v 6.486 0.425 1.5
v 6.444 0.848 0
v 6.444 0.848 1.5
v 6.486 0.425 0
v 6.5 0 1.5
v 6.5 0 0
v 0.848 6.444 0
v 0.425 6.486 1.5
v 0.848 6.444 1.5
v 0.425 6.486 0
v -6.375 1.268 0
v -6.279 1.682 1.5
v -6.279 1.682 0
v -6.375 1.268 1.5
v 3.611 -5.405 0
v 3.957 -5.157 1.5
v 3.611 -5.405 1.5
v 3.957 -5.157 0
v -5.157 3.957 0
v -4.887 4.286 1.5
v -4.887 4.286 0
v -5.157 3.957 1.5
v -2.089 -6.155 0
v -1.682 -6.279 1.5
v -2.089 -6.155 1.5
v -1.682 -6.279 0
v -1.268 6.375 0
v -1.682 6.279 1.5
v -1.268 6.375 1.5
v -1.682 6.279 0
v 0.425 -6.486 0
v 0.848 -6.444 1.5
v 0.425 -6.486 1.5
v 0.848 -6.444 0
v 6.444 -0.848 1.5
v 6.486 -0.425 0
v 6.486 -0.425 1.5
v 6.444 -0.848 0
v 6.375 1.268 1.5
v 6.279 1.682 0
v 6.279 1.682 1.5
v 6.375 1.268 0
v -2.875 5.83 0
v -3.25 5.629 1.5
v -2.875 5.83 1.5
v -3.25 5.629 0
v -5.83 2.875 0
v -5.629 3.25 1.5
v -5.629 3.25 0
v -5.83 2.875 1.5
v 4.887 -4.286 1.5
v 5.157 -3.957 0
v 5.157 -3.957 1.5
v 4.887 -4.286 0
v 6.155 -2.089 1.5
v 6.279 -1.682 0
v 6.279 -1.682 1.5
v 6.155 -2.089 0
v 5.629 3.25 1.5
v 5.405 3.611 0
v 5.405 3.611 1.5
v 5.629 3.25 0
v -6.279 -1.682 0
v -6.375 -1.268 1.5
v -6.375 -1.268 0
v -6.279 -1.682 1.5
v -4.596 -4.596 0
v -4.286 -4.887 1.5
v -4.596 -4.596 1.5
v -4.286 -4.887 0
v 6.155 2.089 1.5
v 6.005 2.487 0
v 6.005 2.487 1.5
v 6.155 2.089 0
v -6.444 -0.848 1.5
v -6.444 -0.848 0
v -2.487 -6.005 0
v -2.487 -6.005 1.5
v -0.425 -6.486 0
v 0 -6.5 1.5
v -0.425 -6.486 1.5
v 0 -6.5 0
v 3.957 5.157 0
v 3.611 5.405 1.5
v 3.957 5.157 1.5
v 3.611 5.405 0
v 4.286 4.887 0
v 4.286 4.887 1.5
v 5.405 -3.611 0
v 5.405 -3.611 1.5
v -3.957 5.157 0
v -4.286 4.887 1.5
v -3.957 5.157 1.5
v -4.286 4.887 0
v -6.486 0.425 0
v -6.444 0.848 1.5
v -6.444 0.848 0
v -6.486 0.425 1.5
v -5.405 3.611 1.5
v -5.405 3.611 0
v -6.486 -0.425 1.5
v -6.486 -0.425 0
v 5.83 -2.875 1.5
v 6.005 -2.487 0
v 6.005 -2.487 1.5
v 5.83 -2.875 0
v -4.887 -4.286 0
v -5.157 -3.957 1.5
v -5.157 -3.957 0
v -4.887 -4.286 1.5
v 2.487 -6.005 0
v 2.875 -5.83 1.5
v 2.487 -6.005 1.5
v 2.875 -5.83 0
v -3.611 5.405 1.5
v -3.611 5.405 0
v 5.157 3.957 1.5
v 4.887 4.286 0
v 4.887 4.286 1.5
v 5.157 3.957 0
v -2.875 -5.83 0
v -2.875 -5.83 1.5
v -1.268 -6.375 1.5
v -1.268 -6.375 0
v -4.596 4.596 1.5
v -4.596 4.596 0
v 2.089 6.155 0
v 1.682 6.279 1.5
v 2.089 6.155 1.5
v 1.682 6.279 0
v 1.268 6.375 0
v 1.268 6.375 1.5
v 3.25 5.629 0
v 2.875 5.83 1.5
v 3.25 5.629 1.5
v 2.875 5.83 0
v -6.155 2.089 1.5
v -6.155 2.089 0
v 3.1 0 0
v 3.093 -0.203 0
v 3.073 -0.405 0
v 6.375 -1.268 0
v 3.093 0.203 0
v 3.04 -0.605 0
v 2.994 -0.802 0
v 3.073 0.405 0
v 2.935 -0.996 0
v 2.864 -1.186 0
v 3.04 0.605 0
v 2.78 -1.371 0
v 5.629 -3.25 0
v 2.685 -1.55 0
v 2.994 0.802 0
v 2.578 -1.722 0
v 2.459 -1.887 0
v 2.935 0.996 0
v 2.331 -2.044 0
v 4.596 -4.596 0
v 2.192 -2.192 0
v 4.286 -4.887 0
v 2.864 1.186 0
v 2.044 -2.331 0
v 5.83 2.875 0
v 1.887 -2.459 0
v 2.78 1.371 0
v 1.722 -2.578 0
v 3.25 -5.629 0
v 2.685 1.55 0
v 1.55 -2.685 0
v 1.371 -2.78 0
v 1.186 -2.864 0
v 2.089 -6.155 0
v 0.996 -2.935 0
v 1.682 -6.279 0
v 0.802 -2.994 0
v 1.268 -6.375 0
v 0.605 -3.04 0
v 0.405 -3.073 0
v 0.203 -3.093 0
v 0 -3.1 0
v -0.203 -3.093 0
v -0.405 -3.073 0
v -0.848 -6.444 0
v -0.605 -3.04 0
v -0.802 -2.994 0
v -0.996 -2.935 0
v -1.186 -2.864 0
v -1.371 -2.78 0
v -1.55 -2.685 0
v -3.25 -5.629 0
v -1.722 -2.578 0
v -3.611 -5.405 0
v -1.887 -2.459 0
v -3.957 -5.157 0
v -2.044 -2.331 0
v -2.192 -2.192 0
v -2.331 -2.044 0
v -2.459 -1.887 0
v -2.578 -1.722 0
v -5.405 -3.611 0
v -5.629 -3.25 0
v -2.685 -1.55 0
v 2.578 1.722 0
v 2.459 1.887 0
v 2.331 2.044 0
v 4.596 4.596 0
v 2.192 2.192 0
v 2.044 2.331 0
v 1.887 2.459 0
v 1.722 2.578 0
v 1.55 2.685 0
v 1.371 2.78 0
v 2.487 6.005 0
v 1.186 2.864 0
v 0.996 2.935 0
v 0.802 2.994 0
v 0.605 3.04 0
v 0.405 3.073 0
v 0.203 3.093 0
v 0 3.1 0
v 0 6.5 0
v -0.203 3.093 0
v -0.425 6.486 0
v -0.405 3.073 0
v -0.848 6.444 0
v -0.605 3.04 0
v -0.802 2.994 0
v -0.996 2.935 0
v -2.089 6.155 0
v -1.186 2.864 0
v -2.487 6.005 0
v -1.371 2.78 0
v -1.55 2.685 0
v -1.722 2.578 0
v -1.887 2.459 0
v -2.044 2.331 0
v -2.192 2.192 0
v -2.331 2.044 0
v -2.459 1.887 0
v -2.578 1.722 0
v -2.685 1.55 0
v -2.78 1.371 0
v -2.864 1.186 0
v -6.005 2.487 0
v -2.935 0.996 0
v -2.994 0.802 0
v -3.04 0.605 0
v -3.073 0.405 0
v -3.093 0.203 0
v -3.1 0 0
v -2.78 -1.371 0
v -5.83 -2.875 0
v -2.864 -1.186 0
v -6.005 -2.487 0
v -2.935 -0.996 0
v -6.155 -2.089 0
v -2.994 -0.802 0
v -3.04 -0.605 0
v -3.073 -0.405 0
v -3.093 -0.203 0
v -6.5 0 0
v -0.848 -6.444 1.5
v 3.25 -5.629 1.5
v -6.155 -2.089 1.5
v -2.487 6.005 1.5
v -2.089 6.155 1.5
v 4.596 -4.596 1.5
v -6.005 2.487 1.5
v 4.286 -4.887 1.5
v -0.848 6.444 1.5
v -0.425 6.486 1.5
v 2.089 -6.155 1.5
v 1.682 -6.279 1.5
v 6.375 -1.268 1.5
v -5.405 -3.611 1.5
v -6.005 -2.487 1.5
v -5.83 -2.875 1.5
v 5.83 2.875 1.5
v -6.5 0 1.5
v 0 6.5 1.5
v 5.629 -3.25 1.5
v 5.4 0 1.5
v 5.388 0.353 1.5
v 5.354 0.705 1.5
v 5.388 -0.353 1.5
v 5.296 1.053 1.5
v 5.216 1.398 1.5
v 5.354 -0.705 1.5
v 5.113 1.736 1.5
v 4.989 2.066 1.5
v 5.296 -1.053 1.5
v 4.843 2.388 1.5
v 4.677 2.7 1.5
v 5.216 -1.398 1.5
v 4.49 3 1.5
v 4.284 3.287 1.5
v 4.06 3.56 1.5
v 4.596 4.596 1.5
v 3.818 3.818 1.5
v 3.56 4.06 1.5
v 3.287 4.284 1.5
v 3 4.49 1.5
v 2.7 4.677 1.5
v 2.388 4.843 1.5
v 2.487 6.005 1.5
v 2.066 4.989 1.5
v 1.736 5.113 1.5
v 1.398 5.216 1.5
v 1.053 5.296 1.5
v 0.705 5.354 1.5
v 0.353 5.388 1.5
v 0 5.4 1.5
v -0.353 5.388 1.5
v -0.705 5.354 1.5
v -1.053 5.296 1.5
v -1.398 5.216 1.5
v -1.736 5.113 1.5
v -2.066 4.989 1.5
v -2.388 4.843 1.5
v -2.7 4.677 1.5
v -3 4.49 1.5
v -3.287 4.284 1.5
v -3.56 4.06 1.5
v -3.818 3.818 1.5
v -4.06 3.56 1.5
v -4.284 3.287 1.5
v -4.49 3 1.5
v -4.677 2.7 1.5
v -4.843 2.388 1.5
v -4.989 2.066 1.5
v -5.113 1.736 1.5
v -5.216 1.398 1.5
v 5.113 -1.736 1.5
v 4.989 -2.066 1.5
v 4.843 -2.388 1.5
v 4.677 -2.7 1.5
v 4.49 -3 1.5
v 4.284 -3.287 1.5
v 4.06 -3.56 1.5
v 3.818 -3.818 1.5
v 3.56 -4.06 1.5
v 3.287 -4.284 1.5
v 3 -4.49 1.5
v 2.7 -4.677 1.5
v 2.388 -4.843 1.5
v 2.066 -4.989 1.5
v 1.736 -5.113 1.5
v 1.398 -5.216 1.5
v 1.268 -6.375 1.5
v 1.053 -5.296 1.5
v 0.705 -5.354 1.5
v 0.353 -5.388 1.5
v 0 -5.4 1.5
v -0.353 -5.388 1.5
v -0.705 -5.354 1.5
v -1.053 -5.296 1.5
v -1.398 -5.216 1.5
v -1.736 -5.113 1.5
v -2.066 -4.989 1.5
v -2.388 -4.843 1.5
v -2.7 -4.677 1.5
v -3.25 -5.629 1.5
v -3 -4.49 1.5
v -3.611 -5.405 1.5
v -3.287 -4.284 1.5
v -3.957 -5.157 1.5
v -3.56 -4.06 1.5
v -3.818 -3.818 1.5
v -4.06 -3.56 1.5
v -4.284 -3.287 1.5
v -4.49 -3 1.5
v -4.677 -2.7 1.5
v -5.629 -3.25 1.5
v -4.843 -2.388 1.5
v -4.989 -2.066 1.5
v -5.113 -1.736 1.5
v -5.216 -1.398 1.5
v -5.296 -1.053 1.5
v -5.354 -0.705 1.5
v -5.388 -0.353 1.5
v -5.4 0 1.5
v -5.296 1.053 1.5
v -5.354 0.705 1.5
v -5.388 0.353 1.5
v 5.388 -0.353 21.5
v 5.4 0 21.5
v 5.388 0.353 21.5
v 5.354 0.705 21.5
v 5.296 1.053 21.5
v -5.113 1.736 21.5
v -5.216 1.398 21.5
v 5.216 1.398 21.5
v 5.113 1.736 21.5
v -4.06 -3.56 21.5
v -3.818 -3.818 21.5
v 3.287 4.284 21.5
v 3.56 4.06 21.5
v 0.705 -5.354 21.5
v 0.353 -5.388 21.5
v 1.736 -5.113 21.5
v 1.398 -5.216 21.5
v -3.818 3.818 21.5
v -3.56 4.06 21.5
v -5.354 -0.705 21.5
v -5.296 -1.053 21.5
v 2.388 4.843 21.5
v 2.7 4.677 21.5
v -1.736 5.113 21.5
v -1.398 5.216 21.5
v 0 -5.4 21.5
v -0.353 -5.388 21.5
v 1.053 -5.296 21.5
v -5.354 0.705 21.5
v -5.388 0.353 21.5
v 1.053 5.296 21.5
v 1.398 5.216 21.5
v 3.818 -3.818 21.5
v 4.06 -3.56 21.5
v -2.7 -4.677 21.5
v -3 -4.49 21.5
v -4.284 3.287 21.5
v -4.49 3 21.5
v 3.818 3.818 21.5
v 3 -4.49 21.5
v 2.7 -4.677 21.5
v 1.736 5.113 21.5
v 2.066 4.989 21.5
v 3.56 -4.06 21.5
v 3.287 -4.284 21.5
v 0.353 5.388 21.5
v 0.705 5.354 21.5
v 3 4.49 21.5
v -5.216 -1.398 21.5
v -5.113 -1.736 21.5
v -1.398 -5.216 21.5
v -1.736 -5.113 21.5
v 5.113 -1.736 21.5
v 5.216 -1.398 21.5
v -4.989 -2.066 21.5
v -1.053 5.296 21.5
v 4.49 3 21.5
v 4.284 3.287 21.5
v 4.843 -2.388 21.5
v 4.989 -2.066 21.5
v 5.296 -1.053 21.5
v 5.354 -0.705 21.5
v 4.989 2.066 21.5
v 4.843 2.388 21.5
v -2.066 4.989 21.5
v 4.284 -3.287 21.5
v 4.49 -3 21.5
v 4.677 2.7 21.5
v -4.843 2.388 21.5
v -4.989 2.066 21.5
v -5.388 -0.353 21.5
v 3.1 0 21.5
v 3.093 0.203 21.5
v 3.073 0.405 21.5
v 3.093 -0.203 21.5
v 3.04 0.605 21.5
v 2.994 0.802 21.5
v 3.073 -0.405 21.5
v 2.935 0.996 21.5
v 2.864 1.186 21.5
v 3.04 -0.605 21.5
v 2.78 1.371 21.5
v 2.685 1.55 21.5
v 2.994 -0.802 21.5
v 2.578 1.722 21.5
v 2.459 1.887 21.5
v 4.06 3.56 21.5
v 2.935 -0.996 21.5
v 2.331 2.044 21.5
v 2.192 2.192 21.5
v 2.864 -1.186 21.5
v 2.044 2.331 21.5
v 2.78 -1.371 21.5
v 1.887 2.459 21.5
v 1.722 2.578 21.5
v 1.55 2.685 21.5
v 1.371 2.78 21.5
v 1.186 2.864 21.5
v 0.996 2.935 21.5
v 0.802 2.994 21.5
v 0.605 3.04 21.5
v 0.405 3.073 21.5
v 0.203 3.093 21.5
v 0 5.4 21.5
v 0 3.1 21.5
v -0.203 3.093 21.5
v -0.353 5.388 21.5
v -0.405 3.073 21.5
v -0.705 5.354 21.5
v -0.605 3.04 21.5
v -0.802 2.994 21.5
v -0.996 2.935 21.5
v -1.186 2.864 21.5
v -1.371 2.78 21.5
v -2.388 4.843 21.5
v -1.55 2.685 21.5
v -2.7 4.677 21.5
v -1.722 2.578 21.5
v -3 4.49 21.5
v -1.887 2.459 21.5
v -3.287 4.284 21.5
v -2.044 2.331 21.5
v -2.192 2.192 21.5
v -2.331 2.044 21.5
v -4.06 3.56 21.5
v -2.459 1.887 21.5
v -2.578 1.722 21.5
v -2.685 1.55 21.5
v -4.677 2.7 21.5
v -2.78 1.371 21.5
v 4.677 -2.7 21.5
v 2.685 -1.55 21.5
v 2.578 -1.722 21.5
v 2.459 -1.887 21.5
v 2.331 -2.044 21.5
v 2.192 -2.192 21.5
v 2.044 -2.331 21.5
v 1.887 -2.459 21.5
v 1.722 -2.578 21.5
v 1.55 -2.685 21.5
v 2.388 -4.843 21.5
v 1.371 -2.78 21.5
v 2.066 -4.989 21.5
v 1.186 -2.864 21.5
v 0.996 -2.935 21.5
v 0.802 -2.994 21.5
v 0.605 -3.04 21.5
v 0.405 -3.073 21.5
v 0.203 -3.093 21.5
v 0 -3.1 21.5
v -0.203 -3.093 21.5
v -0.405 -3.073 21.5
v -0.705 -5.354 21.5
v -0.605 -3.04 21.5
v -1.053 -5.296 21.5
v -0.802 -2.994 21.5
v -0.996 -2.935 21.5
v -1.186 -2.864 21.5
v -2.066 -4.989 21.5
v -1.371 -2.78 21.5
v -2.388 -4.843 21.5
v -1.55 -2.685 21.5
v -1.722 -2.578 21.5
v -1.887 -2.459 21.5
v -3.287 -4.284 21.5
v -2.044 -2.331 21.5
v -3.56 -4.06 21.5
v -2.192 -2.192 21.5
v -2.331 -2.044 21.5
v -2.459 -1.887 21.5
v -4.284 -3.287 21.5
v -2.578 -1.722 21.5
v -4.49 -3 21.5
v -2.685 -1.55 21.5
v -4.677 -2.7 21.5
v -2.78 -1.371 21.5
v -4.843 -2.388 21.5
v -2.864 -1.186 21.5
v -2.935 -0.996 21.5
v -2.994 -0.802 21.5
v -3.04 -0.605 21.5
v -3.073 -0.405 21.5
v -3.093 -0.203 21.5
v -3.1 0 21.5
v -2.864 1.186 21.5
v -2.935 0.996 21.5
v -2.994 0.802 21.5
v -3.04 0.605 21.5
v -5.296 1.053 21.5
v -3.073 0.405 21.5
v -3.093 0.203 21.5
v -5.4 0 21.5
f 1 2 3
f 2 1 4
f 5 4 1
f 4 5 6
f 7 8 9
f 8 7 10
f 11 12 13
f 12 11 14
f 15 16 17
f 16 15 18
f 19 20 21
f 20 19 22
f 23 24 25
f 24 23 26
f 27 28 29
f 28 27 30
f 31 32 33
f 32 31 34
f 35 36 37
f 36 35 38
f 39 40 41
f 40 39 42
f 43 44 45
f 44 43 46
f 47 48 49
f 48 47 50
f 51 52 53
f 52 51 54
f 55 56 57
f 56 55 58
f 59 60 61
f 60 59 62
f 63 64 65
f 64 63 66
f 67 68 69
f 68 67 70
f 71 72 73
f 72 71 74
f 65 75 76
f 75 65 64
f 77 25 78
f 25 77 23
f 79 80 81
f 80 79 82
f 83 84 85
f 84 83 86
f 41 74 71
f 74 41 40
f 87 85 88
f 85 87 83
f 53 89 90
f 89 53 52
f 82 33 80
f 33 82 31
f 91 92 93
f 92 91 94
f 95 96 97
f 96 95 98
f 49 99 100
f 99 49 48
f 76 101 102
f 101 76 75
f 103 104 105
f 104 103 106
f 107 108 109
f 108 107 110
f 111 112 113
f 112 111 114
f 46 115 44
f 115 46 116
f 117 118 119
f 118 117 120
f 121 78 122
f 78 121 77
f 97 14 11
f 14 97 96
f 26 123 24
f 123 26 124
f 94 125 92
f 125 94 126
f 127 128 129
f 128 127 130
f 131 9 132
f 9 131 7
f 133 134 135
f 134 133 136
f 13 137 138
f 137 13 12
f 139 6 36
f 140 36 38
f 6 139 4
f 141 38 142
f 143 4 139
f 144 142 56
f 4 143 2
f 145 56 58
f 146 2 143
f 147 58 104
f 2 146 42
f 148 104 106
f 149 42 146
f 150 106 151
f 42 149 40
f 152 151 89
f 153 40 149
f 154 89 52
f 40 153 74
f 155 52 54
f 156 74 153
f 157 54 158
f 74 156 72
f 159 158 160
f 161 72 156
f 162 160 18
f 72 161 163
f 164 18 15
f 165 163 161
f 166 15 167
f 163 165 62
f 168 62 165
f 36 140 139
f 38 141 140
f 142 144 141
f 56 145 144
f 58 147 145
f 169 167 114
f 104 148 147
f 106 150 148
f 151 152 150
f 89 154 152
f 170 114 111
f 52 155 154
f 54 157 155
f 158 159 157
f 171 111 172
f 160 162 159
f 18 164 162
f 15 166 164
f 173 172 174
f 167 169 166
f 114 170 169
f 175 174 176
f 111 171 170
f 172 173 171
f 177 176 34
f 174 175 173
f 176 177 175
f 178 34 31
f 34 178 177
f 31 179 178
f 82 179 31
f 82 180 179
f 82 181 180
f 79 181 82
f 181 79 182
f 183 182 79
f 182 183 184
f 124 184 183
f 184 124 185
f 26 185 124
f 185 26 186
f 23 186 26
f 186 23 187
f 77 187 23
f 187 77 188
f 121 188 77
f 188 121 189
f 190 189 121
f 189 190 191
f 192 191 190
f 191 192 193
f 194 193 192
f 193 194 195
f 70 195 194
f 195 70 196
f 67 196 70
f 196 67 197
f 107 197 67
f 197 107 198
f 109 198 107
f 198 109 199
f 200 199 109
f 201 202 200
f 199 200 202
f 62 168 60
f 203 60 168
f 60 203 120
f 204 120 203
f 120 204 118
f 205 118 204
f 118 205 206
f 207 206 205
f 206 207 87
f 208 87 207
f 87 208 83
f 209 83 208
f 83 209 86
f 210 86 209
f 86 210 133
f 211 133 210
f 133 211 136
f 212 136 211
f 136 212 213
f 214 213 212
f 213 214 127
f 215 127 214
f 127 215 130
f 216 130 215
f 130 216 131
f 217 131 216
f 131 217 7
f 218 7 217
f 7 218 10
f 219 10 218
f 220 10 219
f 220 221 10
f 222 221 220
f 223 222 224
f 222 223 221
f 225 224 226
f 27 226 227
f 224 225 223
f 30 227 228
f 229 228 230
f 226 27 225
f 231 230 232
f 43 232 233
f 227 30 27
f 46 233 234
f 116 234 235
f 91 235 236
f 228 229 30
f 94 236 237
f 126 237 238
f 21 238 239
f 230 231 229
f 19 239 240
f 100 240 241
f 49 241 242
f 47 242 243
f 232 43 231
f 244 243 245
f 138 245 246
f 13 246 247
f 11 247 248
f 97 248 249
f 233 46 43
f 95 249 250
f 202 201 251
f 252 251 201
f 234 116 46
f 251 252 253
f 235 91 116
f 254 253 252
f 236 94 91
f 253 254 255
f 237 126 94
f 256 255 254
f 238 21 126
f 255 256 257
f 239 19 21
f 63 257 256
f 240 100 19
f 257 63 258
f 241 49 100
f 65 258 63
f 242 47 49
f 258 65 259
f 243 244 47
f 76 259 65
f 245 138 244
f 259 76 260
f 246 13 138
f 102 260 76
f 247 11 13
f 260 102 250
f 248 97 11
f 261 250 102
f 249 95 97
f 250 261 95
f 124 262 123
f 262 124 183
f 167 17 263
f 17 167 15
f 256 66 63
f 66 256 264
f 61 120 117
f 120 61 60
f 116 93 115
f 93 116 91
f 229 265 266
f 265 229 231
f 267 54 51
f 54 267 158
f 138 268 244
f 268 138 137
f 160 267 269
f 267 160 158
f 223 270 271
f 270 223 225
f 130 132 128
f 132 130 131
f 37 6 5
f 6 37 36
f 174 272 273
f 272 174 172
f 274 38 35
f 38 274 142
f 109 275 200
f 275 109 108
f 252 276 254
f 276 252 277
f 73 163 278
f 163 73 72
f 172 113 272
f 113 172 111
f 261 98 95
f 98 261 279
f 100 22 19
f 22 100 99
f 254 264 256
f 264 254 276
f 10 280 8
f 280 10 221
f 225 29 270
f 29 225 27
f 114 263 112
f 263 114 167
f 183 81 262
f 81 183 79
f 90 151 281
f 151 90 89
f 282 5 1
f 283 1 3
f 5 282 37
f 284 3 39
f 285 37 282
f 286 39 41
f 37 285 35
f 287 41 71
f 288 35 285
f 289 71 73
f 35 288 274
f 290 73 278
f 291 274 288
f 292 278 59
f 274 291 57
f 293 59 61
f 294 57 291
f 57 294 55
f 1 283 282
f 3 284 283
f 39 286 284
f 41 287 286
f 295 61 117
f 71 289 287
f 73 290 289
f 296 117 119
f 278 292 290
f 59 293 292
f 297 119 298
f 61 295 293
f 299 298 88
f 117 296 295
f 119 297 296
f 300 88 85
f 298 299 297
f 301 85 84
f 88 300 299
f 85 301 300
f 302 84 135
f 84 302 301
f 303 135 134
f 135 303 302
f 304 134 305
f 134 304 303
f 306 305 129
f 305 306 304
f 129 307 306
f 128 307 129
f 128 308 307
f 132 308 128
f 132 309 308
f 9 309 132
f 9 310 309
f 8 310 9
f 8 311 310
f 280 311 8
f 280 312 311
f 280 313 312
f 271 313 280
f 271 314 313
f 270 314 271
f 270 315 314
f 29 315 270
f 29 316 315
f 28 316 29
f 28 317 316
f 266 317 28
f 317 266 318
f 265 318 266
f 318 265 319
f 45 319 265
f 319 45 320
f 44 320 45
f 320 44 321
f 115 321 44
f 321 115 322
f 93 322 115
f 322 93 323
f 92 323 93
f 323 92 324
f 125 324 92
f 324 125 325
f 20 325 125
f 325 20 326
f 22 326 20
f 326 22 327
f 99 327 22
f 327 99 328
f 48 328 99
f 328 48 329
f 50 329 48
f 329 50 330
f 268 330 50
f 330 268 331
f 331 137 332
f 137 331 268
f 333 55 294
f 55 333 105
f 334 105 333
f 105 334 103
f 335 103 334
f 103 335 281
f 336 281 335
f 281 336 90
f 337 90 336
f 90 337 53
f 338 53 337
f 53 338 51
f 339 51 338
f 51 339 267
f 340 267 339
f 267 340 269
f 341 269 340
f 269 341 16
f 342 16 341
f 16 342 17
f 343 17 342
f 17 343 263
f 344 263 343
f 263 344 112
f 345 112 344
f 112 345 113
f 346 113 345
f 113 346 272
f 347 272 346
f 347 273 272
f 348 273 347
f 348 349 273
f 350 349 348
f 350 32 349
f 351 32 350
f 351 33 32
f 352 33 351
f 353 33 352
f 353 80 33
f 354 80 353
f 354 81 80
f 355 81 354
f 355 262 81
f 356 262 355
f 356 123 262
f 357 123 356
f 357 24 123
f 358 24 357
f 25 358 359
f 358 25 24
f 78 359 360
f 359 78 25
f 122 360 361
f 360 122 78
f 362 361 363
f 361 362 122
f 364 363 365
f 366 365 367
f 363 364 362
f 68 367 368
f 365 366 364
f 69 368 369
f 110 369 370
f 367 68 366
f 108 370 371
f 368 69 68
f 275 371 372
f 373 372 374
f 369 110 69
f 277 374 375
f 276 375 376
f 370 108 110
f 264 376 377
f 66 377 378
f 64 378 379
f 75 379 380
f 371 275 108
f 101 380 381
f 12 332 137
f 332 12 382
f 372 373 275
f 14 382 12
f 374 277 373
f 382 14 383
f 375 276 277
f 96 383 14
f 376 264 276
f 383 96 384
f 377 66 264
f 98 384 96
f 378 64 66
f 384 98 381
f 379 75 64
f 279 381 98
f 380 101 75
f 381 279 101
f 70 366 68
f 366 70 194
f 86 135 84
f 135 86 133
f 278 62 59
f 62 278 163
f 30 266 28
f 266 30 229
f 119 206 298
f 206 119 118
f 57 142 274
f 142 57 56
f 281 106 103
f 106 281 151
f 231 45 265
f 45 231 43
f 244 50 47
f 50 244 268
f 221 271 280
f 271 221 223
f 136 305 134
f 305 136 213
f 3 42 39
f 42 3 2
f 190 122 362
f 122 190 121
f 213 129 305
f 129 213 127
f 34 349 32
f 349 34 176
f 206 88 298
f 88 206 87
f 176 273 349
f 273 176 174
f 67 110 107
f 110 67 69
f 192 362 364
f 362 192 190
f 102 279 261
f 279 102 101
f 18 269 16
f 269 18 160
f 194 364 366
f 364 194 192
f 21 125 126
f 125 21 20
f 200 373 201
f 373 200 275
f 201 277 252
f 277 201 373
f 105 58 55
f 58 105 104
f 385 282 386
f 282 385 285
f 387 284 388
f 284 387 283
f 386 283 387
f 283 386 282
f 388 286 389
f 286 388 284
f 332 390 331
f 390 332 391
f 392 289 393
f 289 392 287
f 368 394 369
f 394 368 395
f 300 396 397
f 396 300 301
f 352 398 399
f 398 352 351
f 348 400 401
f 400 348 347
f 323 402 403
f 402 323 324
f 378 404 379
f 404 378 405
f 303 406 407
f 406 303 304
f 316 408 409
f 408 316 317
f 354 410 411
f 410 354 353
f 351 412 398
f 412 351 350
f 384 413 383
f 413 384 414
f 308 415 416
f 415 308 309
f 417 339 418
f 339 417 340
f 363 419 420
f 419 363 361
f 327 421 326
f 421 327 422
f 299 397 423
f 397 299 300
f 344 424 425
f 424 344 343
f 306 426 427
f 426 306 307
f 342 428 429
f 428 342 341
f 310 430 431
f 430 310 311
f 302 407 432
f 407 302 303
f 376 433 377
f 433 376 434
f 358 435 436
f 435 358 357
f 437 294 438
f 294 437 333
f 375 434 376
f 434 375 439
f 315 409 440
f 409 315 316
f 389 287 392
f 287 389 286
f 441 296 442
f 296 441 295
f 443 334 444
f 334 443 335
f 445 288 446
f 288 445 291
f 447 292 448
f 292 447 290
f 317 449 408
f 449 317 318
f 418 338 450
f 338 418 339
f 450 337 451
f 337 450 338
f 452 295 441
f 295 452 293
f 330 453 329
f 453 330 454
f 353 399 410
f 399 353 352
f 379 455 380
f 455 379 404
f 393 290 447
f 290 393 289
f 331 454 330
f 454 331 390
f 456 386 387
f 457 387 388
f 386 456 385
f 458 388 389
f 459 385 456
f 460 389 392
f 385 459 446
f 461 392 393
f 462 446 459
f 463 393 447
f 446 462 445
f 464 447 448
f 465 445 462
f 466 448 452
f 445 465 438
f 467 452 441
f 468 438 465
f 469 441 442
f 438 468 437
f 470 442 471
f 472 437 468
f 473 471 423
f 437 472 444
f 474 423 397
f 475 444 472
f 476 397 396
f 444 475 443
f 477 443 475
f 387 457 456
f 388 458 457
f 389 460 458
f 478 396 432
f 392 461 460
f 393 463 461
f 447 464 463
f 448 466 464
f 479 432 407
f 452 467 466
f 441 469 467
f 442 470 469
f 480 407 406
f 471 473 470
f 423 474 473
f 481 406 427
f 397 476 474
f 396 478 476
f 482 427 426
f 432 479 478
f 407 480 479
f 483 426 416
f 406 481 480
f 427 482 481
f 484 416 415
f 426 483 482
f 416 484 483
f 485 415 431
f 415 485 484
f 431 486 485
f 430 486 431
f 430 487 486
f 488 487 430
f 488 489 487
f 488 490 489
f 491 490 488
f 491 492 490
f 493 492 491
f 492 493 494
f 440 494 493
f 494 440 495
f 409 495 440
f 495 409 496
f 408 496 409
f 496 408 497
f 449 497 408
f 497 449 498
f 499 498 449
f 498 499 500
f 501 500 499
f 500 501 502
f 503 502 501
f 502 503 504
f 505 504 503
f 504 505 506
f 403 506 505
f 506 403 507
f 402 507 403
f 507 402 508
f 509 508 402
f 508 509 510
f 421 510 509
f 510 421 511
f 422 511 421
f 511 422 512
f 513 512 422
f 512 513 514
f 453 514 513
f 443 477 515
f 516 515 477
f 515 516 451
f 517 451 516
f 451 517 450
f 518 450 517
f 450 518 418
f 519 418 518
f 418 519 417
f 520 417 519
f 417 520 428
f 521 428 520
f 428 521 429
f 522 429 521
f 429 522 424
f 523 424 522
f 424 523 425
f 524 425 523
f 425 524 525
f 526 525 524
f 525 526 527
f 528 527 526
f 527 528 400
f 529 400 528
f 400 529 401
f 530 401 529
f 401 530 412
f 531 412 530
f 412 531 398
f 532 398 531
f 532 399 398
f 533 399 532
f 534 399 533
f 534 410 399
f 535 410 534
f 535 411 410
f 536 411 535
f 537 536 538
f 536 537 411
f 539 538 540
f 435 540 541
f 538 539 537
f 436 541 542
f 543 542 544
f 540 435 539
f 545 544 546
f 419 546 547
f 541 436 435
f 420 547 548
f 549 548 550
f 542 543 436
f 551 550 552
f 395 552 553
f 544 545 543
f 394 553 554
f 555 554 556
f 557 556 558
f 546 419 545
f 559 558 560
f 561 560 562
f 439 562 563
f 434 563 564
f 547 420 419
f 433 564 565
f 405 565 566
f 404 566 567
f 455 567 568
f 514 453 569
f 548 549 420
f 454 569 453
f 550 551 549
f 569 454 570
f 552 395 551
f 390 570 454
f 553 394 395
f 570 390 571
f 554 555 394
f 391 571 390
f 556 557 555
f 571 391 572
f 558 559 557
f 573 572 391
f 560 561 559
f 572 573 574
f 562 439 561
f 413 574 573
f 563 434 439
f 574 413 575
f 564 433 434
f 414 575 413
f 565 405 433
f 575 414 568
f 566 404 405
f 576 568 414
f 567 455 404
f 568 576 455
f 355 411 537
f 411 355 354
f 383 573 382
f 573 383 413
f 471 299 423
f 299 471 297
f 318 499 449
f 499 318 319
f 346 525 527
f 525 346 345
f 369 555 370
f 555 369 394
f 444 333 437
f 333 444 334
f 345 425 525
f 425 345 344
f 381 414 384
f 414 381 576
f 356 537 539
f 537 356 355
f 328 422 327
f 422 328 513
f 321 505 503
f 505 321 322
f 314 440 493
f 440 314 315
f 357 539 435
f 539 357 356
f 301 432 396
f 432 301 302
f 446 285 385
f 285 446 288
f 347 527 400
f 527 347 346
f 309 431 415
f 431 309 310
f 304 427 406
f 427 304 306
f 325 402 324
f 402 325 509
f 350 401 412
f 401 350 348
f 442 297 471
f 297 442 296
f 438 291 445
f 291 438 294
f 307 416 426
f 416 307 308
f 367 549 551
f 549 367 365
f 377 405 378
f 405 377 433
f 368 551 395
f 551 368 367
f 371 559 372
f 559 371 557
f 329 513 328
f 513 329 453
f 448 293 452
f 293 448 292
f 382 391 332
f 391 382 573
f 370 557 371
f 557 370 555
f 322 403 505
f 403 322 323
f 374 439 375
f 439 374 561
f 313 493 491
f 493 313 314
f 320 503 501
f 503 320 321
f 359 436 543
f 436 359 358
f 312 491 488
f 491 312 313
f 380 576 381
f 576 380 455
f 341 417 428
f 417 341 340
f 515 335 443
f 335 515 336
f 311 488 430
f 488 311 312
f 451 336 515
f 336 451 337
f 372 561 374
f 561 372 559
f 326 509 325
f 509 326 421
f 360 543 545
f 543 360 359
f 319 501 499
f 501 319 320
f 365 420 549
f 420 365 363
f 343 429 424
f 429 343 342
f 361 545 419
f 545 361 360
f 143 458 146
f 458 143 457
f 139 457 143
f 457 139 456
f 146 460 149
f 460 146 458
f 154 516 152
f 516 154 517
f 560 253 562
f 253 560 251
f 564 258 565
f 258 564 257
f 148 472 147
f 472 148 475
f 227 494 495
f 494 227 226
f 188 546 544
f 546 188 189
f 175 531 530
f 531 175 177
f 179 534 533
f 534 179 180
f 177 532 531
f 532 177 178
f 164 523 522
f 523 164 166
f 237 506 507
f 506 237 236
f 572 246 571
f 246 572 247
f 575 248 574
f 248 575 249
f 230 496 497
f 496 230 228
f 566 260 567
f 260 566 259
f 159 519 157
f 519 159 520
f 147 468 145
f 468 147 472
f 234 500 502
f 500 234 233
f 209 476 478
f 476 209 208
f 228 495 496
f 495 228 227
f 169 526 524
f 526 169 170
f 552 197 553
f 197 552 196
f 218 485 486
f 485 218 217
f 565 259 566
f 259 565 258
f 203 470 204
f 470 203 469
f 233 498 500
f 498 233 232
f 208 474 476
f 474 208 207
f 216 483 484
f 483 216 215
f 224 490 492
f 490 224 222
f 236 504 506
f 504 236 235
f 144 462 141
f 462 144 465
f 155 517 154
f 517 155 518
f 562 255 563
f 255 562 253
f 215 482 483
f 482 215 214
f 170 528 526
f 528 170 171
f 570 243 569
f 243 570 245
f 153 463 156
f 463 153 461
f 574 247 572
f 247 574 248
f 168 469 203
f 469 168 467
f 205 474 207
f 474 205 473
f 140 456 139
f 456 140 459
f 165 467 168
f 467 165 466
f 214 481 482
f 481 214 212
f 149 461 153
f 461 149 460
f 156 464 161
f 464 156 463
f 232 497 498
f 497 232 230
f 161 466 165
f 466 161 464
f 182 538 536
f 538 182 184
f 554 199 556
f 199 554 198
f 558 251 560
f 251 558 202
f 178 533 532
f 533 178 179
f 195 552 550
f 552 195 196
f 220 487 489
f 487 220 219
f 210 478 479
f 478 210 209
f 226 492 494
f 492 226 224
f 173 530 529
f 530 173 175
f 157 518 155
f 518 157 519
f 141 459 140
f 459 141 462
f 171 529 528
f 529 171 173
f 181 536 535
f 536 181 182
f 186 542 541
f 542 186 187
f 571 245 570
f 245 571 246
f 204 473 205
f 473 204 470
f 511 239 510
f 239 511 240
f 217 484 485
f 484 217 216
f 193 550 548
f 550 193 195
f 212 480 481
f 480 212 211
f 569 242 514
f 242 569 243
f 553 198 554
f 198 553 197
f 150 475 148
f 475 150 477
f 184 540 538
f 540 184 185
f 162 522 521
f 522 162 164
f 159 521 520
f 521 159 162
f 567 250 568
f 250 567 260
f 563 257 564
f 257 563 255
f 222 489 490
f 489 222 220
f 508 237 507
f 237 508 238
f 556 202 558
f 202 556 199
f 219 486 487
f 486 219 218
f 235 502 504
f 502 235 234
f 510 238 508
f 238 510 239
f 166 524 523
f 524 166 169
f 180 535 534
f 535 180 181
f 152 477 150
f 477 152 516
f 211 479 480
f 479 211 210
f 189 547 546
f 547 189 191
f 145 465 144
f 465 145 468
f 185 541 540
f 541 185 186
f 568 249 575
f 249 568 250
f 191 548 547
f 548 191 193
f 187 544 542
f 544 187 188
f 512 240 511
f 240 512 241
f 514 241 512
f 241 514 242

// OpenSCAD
// PCR tube adapter sleeve: fits a 0.2 mL tube into a 1.5 mL rack hole
// Print orientation: collar on the bed (z = 0), sleeve body rises to z = 21.5

// ---------------- Parameters ----------------
collar_d      = 13;    // collar outer diameter
collar_h      = 1.5;   // collar thickness (z = 0 to 1.5)
sleeve_od     = 10.8;  // sleeve body outer diameter
sleeve_h      = 20;    // sleeve body height above collar (z = 1.5 to 21.5)
bore_d        = 6.2;   // through-bore diameter
eps           = 0.5;   // cutter overshoot past faces

$fn = 96;

// ---------------- Model ----------------
total_h = collar_h + sleeve_h;   // 21.5 mm overall height

difference() {
    union() {
        // Collar
        cylinder(d = collar_d, h = collar_h);
        // Sleeve body (slightly overlapping the collar for a clean union)
        translate([0, 0, collar_h - 0.01])
            cylinder(d = sleeve_od, h = sleeve_h + 0.01);
    }
    // Full-height through-bore
    translate([0, 0, -eps])
        cylinder(d = bore_d, h = total_h + 2 * eps);
}
